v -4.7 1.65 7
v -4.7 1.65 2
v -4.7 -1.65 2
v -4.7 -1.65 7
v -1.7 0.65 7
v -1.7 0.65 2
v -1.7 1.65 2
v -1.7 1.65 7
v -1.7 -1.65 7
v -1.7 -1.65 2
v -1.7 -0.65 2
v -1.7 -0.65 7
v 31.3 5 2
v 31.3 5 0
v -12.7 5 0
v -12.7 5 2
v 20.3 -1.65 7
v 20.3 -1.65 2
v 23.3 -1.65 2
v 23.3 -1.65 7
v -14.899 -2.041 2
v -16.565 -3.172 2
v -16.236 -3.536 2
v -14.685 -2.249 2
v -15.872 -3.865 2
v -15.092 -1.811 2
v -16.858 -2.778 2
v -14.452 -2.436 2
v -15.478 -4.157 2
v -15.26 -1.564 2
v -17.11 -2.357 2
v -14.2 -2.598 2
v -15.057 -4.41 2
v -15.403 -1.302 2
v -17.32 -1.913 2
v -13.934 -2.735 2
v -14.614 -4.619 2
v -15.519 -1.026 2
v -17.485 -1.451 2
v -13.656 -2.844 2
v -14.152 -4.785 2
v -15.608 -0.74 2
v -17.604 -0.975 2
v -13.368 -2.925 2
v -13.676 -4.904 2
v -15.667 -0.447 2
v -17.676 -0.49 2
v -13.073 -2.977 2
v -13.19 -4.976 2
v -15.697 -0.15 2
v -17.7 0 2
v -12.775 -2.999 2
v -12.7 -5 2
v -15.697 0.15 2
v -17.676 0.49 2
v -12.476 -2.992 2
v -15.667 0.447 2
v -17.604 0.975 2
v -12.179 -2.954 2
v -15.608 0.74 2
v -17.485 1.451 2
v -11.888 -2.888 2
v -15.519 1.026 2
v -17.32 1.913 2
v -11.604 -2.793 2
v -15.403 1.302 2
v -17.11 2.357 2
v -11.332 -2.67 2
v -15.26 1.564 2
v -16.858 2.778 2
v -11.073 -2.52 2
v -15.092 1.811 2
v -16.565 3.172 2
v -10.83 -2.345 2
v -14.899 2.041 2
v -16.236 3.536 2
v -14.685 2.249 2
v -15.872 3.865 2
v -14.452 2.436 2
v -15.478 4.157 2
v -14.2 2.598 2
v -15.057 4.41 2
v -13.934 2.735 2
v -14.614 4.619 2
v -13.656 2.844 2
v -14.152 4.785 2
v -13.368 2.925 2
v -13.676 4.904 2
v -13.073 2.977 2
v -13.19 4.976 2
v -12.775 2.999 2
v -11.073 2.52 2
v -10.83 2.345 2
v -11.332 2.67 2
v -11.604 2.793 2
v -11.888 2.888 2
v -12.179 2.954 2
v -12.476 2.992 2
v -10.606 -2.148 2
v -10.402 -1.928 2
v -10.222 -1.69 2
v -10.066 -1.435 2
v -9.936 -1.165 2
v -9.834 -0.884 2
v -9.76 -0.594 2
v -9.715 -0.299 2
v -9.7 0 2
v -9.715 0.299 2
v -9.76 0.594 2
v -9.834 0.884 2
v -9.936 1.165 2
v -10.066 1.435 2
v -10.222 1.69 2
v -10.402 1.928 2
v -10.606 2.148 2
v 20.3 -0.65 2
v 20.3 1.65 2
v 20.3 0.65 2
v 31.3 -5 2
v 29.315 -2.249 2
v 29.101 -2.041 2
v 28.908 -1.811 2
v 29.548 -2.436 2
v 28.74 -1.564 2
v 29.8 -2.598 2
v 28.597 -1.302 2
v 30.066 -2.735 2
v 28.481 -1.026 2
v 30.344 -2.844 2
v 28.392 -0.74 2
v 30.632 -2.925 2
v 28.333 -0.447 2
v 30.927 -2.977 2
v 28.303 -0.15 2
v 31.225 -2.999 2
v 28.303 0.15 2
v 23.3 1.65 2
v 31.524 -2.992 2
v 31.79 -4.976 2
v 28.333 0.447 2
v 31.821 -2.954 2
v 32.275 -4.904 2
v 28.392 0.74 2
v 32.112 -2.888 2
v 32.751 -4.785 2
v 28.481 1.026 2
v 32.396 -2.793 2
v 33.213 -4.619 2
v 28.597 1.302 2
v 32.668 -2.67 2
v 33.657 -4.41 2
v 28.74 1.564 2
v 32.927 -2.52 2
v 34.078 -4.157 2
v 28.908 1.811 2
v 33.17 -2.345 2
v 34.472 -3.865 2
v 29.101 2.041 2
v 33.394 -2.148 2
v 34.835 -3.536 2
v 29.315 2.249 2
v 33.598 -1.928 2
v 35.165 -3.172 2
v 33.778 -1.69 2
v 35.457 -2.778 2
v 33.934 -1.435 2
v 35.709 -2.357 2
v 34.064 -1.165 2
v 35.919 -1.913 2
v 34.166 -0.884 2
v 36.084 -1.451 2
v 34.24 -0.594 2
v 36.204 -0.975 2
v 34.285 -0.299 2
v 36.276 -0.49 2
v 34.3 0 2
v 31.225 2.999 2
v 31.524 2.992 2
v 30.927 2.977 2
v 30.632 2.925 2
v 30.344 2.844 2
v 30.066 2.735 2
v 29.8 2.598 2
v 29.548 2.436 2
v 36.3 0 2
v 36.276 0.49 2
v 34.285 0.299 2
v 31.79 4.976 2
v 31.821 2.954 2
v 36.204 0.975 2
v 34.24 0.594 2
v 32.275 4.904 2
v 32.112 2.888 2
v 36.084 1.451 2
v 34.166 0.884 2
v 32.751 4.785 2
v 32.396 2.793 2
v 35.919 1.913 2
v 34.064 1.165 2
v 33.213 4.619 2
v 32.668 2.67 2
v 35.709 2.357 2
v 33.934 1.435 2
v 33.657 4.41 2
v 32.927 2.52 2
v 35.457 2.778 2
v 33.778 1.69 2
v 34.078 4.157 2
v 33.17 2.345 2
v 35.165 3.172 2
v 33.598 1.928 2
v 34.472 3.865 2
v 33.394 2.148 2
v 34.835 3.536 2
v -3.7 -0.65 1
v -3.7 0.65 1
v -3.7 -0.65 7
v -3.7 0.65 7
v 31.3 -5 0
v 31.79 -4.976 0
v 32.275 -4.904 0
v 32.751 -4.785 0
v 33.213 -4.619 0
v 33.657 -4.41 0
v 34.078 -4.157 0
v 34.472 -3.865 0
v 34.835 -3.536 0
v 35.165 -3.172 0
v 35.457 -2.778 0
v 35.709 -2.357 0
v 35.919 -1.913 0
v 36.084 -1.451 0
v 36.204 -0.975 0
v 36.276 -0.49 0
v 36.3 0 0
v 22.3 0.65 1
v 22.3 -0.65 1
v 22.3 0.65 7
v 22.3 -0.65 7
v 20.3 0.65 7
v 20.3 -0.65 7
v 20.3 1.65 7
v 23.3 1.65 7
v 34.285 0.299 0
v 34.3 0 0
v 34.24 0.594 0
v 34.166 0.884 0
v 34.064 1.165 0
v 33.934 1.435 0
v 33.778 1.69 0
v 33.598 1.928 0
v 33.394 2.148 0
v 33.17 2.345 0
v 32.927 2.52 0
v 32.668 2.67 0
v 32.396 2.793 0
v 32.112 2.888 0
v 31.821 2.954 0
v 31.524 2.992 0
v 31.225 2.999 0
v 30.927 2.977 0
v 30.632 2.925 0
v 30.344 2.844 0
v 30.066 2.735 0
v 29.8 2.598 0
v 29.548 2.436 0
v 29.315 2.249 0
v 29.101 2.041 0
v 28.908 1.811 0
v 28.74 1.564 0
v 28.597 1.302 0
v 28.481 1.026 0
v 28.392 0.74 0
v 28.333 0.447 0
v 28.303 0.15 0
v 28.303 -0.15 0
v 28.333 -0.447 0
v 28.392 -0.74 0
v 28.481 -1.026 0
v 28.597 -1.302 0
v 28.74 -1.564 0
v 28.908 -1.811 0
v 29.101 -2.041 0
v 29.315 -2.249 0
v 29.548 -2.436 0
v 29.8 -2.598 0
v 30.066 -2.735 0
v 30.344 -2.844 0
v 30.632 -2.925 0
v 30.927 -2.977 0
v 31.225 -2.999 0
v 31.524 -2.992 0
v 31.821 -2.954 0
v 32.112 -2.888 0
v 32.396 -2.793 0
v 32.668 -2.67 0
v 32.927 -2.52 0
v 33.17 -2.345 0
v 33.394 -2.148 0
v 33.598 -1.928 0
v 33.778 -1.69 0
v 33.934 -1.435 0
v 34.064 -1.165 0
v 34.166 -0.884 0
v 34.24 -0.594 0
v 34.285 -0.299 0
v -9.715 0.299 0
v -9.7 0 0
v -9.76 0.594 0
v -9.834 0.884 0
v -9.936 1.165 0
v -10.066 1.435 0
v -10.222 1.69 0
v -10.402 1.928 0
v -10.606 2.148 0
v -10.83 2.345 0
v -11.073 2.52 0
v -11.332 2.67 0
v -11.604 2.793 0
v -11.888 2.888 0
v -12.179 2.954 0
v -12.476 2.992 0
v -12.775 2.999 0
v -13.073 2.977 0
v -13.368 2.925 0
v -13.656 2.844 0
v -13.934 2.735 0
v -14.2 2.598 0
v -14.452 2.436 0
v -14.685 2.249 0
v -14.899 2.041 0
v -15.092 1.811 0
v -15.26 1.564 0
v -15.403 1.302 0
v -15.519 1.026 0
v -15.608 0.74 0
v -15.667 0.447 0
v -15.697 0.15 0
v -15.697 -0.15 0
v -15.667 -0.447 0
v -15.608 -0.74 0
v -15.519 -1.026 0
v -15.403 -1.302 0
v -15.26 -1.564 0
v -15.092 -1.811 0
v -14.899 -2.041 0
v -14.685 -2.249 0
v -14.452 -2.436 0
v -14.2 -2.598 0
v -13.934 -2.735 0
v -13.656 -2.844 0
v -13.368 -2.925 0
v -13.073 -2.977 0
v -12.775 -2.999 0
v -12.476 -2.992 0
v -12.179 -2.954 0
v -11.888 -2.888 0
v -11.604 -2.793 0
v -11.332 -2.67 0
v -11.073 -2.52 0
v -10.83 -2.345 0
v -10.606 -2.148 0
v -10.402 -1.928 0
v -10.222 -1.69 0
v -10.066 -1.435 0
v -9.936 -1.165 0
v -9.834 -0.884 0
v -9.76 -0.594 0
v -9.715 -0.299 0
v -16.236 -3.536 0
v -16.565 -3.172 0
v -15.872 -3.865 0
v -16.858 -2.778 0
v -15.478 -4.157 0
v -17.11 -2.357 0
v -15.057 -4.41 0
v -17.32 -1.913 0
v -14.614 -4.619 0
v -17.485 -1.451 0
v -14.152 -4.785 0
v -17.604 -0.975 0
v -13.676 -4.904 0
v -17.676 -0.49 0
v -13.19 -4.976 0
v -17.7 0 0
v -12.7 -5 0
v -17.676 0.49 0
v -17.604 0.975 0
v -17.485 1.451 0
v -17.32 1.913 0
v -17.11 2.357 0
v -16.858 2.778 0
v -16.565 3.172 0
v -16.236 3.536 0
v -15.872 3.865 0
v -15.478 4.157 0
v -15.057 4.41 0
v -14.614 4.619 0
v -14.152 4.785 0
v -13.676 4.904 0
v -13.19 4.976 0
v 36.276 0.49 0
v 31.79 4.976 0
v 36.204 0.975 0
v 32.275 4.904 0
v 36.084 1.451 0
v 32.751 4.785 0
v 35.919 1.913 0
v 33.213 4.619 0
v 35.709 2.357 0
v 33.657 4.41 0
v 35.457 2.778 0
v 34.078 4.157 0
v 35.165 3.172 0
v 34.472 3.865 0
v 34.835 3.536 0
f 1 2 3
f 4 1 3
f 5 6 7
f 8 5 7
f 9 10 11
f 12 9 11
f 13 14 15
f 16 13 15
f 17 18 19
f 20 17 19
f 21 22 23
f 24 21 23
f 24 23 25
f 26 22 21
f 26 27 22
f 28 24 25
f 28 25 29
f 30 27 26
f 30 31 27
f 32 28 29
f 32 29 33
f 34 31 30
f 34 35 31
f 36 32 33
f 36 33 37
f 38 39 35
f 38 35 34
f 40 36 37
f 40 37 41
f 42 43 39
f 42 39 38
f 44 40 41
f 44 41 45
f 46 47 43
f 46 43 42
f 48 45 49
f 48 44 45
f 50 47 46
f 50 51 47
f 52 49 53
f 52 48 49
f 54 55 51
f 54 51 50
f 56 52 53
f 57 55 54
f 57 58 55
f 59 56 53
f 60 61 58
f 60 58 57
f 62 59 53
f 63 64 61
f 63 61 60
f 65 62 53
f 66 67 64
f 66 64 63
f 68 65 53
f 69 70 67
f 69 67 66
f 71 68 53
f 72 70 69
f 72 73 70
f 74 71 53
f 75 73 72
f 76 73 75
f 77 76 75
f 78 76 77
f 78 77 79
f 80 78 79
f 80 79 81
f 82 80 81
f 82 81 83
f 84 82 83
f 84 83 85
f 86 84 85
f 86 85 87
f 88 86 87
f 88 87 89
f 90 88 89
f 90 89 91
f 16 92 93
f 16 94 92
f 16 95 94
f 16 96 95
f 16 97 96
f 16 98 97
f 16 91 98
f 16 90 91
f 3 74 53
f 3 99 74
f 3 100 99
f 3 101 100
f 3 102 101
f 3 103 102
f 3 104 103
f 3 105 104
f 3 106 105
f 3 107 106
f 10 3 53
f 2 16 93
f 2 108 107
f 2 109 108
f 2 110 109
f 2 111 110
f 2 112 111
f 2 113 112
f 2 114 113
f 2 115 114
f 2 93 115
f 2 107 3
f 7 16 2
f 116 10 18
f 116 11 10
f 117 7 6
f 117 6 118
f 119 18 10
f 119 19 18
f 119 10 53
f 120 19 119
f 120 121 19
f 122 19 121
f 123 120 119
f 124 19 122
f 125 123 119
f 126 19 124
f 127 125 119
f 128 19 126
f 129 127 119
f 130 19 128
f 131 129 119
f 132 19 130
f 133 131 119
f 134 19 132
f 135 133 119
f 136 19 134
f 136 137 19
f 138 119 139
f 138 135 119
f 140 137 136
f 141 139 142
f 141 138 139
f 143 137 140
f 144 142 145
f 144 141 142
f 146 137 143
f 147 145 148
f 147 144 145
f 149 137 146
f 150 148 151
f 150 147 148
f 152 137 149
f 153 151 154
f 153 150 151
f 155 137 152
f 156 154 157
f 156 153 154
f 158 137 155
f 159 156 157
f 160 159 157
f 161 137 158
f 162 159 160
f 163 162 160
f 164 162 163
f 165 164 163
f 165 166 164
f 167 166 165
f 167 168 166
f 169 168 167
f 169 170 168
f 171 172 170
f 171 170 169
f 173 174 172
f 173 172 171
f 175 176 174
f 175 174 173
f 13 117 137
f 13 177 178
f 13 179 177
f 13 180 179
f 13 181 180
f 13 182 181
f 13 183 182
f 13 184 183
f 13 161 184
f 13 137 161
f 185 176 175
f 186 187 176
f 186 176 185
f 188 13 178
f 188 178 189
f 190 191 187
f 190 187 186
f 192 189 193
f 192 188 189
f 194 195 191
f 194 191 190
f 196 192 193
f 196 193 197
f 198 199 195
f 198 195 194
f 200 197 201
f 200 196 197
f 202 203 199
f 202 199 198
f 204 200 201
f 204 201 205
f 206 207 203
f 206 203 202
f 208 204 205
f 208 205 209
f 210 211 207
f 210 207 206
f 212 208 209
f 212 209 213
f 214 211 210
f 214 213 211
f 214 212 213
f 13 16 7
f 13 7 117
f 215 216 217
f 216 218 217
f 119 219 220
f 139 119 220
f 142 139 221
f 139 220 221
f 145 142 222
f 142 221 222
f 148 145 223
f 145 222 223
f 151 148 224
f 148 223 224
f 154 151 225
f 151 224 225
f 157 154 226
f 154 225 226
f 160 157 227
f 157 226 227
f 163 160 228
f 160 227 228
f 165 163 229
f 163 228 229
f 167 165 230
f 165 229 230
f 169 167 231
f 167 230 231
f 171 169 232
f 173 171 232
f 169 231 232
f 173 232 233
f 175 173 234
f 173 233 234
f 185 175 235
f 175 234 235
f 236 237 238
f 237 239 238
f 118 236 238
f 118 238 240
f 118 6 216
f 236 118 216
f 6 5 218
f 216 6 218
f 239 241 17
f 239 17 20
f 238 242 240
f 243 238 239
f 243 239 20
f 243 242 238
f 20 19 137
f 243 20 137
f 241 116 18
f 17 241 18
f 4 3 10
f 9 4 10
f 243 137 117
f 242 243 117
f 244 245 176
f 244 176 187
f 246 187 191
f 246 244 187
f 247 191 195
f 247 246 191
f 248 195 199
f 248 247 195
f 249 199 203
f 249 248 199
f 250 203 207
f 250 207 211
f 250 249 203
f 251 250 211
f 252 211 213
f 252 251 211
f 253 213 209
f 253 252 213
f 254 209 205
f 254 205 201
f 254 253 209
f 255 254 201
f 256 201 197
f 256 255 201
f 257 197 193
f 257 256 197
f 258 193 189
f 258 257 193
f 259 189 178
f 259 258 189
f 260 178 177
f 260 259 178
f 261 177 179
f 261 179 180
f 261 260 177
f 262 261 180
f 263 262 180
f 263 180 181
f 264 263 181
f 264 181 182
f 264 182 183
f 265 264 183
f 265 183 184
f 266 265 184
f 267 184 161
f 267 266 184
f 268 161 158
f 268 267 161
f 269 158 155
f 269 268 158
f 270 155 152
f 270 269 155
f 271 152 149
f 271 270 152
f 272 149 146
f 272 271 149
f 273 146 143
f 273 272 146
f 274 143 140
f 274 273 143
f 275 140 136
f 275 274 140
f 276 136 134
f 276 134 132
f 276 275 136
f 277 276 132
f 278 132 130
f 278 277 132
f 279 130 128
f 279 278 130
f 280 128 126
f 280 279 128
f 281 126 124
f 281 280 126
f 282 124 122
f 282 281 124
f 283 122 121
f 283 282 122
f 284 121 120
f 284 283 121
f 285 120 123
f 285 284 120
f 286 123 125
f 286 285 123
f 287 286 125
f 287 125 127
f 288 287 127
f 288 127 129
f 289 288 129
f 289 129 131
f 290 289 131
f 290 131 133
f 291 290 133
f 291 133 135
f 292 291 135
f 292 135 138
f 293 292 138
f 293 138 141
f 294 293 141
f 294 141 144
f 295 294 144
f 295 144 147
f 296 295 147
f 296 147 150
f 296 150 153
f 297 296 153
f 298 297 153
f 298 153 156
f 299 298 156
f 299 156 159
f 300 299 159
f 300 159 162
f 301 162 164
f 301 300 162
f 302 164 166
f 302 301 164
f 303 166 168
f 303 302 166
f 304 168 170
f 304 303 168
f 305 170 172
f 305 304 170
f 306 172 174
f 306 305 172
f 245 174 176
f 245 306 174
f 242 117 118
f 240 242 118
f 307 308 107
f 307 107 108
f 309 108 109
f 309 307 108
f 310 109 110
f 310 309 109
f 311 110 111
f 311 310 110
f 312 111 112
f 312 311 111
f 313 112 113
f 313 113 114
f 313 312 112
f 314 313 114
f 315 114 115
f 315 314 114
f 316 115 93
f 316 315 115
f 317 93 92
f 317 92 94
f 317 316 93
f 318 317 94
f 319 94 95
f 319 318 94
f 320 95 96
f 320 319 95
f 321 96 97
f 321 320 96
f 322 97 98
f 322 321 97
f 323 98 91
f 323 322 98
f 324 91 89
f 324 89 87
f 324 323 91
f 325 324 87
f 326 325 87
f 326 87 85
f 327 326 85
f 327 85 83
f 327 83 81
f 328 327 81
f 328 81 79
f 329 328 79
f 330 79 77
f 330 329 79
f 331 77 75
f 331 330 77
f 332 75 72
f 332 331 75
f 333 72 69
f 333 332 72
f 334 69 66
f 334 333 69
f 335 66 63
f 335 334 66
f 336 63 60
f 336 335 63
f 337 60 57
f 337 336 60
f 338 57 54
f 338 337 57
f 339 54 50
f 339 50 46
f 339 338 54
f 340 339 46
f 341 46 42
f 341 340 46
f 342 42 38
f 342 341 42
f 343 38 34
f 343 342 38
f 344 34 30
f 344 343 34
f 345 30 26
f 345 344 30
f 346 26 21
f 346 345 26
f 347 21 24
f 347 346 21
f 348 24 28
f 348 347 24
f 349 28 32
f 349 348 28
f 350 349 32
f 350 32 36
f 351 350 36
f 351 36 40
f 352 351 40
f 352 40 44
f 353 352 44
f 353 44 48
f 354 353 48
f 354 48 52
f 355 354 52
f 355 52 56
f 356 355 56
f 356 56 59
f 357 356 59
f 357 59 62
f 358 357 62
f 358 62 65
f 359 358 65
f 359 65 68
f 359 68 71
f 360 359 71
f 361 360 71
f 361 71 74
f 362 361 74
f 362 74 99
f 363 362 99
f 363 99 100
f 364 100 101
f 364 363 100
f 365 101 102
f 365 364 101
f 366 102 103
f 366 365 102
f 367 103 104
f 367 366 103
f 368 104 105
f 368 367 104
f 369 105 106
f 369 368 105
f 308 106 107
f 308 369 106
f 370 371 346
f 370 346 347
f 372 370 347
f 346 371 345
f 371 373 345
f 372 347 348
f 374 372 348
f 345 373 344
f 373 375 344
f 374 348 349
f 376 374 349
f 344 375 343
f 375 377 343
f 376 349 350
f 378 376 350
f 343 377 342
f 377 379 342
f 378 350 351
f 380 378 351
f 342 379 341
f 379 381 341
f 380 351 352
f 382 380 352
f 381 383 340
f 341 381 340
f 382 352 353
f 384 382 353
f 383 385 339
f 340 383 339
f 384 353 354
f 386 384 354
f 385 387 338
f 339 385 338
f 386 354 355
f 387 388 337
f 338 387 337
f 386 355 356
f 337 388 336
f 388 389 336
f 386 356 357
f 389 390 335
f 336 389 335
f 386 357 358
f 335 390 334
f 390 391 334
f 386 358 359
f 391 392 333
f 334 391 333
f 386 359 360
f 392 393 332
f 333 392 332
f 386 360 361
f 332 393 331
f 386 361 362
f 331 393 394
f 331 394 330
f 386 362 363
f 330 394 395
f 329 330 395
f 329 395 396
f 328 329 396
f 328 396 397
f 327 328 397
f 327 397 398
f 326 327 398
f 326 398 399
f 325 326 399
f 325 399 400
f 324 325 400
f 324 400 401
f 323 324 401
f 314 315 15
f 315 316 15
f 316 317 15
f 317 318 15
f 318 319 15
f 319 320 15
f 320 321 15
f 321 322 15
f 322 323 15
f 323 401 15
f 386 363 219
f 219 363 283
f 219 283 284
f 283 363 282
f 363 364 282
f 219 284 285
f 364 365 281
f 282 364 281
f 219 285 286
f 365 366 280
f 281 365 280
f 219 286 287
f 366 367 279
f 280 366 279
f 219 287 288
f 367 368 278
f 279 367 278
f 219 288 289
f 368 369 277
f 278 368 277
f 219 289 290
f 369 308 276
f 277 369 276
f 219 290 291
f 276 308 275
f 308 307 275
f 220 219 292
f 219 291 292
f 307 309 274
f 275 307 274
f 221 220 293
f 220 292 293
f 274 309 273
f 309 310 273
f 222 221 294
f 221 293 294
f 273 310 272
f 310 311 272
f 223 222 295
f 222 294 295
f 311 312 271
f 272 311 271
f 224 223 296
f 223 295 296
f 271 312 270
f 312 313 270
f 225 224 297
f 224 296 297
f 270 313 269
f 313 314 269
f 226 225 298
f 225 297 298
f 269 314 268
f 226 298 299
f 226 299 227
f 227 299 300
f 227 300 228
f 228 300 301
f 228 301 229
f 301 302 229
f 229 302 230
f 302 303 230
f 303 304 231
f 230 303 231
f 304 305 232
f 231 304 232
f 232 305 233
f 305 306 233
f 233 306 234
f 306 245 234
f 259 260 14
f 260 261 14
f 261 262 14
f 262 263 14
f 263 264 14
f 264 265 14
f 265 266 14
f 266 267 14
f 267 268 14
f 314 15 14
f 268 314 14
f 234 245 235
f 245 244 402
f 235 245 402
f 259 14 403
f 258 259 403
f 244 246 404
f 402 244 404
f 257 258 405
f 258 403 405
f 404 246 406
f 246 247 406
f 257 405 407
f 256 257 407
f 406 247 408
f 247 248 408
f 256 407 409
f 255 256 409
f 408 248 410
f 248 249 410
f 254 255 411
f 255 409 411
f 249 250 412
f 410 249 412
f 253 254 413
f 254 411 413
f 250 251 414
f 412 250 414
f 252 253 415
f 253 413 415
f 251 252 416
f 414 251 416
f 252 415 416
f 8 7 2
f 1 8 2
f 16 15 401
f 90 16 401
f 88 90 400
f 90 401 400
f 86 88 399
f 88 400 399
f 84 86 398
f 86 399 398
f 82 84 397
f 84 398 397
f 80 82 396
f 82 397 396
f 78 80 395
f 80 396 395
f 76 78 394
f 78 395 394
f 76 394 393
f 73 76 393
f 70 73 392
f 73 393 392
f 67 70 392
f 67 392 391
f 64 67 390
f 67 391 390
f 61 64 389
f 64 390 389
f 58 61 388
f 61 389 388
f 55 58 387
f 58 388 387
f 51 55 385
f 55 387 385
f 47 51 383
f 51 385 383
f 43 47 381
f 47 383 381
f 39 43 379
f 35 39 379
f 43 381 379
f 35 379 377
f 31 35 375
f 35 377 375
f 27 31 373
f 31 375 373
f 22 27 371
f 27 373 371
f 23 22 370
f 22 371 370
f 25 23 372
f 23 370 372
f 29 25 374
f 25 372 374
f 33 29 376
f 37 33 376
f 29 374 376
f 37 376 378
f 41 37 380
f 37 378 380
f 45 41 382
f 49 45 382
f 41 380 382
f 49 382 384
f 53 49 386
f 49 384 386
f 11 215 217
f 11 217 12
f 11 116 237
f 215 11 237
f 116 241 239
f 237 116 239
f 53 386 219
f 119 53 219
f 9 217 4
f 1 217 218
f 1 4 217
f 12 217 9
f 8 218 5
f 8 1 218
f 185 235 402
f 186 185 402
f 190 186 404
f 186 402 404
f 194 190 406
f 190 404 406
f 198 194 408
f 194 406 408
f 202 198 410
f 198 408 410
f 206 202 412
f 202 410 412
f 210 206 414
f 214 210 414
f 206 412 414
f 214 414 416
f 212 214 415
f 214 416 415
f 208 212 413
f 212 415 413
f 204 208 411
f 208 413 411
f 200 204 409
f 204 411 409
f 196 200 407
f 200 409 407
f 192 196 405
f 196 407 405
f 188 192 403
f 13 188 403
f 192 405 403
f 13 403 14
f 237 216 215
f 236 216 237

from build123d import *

# Parameters (mm, degrees)
F0_R     = 3
F1_DEPTH = 2
F3_DEPTH = 5
F2_W     = 11
F2_H     = 0.65
F2_W_2   = 2
F4_DEPTH = 1


with BuildPart() as f1:
    # F0 (on Top) → F1 (new body)
    with BuildSketch(Plane.XY):
        with BuildLine():
            ThreePointArc((31.2996847679, -5), (26.2996847679, 0), (31.2996847679, 5))
            Line((31.2996847679, 5), (-12.7003152321, 5))
            ThreePointArc((-12.7003152321, 5), (-9.1647813261, 3.5355339059), (-7.7003152321, 0))
            ThreePointArc((-7.7003152321, 0), (-9.1647813261, -3.5355339059), (-12.7003152321, -5))
            Line((-12.7003152321, -5), (31.2996847679, -5))
        make_face()
        with BuildLine():
            ThreePointArc((-7.7003152321, 0), (-9.1647813261, 3.5355339059), (-12.7003152321, 5))
            ThreePointArc((-12.7003152321, 5), (-17.7003152321, 0), (-12.7003152321, -5))
            ThreePointArc((-12.7003152321, -5), (-9.1647813261, -3.5355339059), (-7.7003152321, 0))
        make_face()
        with Locations((-12.7003152321, 0)):
            Circle(F0_R, mode=Mode.SUBTRACT)
        with BuildLine():
            ThreePointArc((31.2996847679, -5), (34.8352186739, -3.5355339059), (36.2996847679, 0))
            ThreePointArc((36.2996847679, 0), (34.8352186739, 3.5355339059), (31.2996847679, 5))
            ThreePointArc((31.2996847679, 5), (26.2996847679, 0), (31.2996847679, -5))
        make_face()
        with Locations((31.2996847679, 0)):
            Circle(F0_R, mode=Mode.SUBTRACT)
    extrude(amount=F1_DEPTH)

    # F2 (on face) → F3 (join)
    with BuildSketch(Plane.XY.offset(2)):
        Polygon((-3.7003152321, 0), (-4.7003152321, 0), (-4.7003152321, -1.65), (-1.7003152321, -1.65), (-1.7003152321, -0.65), (-3.7003152321, -0.65), align=None)
        Polygon((-1.7003152321, 0.65), (-1.7003152321, 1.65), (-4.7003152321, 1.65), (-4.7003152321, 0), (-3.7003152321, 0), (-3.7003152321, 0.65), align=None)
        Polygon((23.2996847679, 1.65), (20.2996847679, 1.65), (20.2996847679, 0.65), (22.2996847679, 0.65), (22.2996847679, 0), (23.2996847679, 0), align=None)
        Polygon((23.2996847679, -1.65), (23.2996847679, 0), (22.2996847679, 0), (22.2996847679, -0.65), (20.2996847679, -0.65), (20.2996847679, -1.65), align=None)
    extrude(amount=F3_DEPTH)

    # F2 (on face) → F4 (cut)
    with BuildSketch(Plane.XY.offset(2)):
        with Locations((3.7996847679, -0.325)):
            Rectangle(F2_W, F2_H)
        with Locations((3.7996847679, 0.325)):
            Rectangle(F2_W, F2_H)
        with Locations((-2.7003152321, -0.325)):
            Rectangle(F2_W_2, F2_H)
        with Locations((-2.7003152321, 0.325)):
            Rectangle(F2_W_2, F2_H)
        with Locations((14.7996847679, -0.325)):
            Rectangle(F2_W, F2_H)
        with Locations((14.7996847679, 0.325)):
            Rectangle(F2_W, F2_H)
        with Locations((21.2996847679, -0.325)):
            Rectangle(F2_W_2, F2_H)
        with Locations((21.2996847679, 0.325)):
            Rectangle(F2_W_2, F2_H)
    extrude(amount=-F4_DEPTH, mode=Mode.SUBTRACT)


solid = f1.part
